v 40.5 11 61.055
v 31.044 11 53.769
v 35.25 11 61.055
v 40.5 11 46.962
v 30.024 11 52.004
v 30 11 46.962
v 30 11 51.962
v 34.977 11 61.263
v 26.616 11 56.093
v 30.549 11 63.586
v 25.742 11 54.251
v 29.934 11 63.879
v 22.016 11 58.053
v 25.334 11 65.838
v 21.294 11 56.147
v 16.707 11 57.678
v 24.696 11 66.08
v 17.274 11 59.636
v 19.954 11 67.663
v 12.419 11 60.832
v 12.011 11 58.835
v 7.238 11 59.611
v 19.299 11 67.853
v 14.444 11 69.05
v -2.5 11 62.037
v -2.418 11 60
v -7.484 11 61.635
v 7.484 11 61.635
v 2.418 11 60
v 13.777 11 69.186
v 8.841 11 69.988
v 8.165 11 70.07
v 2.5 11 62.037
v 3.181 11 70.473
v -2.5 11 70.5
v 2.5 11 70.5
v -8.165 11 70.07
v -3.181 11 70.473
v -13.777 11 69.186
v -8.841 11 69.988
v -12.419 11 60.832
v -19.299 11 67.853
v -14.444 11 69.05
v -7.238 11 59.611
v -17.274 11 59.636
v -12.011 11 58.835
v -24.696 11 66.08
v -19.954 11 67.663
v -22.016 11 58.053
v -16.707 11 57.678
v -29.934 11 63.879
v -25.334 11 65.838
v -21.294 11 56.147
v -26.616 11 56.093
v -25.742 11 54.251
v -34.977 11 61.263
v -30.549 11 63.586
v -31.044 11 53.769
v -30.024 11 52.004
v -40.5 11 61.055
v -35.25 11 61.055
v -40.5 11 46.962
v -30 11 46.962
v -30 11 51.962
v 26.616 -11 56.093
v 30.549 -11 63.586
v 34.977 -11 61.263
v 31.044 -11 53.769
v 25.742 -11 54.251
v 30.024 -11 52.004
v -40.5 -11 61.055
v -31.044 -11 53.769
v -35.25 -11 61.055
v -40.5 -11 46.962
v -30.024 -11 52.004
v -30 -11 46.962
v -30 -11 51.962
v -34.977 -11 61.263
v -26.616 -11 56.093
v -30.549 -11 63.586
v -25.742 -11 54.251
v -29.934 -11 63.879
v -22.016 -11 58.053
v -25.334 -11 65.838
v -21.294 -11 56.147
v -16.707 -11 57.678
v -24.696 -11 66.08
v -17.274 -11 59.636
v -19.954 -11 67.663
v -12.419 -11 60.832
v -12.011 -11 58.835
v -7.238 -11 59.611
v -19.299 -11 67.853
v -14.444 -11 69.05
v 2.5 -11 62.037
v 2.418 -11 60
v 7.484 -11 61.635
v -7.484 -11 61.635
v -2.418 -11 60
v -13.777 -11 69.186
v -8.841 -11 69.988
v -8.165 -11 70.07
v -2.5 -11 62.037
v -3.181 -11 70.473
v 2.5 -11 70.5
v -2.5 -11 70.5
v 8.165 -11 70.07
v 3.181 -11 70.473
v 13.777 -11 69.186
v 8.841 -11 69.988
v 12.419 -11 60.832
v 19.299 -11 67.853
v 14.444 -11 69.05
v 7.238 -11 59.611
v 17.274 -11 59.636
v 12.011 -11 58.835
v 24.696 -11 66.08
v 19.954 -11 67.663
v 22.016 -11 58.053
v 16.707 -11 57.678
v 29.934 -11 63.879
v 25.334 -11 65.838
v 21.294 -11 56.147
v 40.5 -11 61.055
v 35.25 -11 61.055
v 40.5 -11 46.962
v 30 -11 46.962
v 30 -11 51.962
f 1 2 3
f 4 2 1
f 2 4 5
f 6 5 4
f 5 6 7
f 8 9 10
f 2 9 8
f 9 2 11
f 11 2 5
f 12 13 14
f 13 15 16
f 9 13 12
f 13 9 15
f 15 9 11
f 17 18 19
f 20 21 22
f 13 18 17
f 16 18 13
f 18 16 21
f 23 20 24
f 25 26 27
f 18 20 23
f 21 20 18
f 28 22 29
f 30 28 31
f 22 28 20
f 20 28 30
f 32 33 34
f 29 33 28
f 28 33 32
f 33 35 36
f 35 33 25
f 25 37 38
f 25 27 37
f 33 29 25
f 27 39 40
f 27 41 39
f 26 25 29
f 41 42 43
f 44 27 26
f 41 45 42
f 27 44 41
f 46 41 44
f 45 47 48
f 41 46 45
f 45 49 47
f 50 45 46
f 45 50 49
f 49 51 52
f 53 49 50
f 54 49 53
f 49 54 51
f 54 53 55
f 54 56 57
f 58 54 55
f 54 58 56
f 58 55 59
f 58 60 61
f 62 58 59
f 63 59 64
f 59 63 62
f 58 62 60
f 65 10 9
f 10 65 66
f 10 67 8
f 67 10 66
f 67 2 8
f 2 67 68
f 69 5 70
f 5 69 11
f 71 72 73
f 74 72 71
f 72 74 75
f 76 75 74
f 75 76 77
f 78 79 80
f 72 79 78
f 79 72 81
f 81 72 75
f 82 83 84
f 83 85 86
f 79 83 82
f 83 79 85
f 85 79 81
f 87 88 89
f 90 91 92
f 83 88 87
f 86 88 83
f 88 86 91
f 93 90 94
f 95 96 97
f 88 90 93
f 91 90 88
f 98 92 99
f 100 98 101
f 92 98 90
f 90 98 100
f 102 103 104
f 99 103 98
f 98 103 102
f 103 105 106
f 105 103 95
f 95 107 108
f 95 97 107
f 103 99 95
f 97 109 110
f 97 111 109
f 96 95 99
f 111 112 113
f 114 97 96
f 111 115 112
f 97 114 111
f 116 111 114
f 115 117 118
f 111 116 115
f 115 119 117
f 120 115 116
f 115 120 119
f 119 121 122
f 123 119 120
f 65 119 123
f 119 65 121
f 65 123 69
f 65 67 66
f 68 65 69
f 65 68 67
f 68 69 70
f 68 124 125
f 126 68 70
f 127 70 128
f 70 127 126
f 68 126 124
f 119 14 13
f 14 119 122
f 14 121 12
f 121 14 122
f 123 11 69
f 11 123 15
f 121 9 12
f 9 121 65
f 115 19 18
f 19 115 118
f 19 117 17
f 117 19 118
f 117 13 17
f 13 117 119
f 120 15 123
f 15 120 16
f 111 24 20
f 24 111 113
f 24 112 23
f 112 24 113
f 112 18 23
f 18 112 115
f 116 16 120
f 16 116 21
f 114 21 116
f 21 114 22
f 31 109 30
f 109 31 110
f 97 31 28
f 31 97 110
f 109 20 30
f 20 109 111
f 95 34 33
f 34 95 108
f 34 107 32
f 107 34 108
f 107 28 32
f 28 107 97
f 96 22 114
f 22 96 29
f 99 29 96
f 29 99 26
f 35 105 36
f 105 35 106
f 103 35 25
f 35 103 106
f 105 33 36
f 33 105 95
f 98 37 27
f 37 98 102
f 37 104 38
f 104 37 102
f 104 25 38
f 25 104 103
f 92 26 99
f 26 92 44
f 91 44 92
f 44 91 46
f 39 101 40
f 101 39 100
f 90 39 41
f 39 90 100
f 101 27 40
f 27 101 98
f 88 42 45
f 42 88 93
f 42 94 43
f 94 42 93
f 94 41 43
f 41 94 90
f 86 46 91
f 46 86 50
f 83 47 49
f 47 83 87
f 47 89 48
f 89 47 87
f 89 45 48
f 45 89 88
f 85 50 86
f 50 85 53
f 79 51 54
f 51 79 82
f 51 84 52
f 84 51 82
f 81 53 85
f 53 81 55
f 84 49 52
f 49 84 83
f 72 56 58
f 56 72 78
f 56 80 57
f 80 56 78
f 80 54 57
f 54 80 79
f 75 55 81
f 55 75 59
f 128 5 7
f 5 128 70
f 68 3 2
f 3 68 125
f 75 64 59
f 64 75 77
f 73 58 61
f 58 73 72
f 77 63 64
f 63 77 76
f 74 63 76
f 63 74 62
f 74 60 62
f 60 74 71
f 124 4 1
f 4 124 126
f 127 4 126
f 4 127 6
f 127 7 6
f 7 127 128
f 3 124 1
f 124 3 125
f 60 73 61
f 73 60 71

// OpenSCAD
// Dimensions d'une brique classique
L = 22;   // longueur (profondeur)
l = 10.5; // largeur (épaisseur radiale)
h = 5;    // hauteur (suit l'arc)

// Paramètres de l'arc
corde = 60;           // distance entre les points d'appui de l'arc
rayon = 60;           // rayon en mm (rayon intérieur)

// Angle de l'arc en degrés
 angle = 2 * asin(corde / (2 * rayon));

module arc(angle, rayon) {
    // Conversion en radians pour les calculs internes
    angle_rad_local = angle * (PI / 180);
    
    // Longueur de l'arc au rayon donné
    longueur_arc = rayon * angle_rad_local;
    
    // Nombre de briques nécessaires
    nb_briques = ceil(longueur_arc / h);
    
    // Calcul de la longueur d'arc disponible par brique
    // On divise la longueur totale d'arc par le nombre de briques
    longueur_par_brique = longueur_arc / nb_briques;
    
    // Angle entre chaque brique (basé sur la longueur réelle par brique)
    angle_brique = (longueur_par_brique / rayon) * (180 / PI);
    
    // Angle complémentaire pour que l'arc commence à l'horizontale
    angle_complementaire = 90 - (angle / 2);
    
    // Décalage radial pour que les briques ne se chevauchent pas
    rayon_centre = rayon + l/2;
    
    for (i = [0 : nb_briques - 1]) {
        // Angle de la brique le long de l'arc (centrée sur sa position)
        angle_arc = i * angle_brique + angle_brique/2;
        
        // Angle pour le calcul de la position (angle du rayon)
        angle_rayon = angle_complementaire + angle_arc;
        
        // Position sur l'arc (au centre de la brique en épaisseur)
        x = rayon_centre * cos(angle_rayon);
        z = rayon_centre * sin(angle_rayon);
        
        // Rotation de la brique : la tangente est perpendiculaire au rayon
        rotation_y = -(angle_rayon);
        
        translate([x, 0, z])
        rotate([0, rotation_y, 0])
        cube([l, L, h], center=true);
    }
}
// Exemple d'utilisation
color("red") arc(angle, rayon);

 angle_complementaire = 90 - (angle / 2);

module prism(length, width, height)
{
    polyhedron(
        points=[
            [0,   0,   0],   // 0
            [width, 0,   height], // 1
            [width, length, height], // 2
            [0,   length, 0],   // 3
            [width, 0,   0],   // 4
            [width, length, 0]    // 5
        ],
        faces=[
            [3,2,1,0], // top sloping face (A)
            [5,4,1,2],  // vertical rectangular face (B)
            [4,5,3,0], // bottom face (C)
            [1,4,0], // rear triangular face (D)
            [5,2,3] // front triangular face (E)
        ]
    );
}


length = L;
height = l* sin(angle_complementaire);
width = l* cos(angle_complementaire);


// Position du point sur l'arc à l'angle 0 (début de l'arc)
x_start = rayon * cos(angle_complementaire);
z_start = rayon * sin(angle_complementaire);

xs = x_start;
ys = -L/2; 
zs =  z_start;
 
translate([xs, ys, zs])
color("yellow") prism(length, width, height);

rotate([0, 0, 180])
translate([xs, ys, zs])
color("yellow") prism(length, width, height);

module cube_assise(longueur,largeur,hauteur){
cube([longueur,largeur,hauteur]);
  }

longueur=l;
largeur=L;
hauteur=h;
xc = xs+l;
yc = -L/2; 
zc =  zs-h; 
translate([-xc, yc, zc])
color("yellow") cube_assise(longueur,largeur,hauteur);
  
rotate([0, 0, 180])
translate([-xc, yc, zc])
color("yellow") cube_assise(longueur,largeur,hauteur);


longueur1=height;
largeur1=L;
hauteur1=l-width;
  
xb=zs+height;
yb=yc+L;
zb=xc-hauteur1;
rotate([0, 90, 0])
translate([-xb, -yb, zb])
color("yellow") cube_assise(longueur1,largeur1,hauteur1);

rotate([0, 90, 180])
translate([-xb, -yb, zb])
color("yellow") cube_assise(longueur1,largeur1,hauteur1);
